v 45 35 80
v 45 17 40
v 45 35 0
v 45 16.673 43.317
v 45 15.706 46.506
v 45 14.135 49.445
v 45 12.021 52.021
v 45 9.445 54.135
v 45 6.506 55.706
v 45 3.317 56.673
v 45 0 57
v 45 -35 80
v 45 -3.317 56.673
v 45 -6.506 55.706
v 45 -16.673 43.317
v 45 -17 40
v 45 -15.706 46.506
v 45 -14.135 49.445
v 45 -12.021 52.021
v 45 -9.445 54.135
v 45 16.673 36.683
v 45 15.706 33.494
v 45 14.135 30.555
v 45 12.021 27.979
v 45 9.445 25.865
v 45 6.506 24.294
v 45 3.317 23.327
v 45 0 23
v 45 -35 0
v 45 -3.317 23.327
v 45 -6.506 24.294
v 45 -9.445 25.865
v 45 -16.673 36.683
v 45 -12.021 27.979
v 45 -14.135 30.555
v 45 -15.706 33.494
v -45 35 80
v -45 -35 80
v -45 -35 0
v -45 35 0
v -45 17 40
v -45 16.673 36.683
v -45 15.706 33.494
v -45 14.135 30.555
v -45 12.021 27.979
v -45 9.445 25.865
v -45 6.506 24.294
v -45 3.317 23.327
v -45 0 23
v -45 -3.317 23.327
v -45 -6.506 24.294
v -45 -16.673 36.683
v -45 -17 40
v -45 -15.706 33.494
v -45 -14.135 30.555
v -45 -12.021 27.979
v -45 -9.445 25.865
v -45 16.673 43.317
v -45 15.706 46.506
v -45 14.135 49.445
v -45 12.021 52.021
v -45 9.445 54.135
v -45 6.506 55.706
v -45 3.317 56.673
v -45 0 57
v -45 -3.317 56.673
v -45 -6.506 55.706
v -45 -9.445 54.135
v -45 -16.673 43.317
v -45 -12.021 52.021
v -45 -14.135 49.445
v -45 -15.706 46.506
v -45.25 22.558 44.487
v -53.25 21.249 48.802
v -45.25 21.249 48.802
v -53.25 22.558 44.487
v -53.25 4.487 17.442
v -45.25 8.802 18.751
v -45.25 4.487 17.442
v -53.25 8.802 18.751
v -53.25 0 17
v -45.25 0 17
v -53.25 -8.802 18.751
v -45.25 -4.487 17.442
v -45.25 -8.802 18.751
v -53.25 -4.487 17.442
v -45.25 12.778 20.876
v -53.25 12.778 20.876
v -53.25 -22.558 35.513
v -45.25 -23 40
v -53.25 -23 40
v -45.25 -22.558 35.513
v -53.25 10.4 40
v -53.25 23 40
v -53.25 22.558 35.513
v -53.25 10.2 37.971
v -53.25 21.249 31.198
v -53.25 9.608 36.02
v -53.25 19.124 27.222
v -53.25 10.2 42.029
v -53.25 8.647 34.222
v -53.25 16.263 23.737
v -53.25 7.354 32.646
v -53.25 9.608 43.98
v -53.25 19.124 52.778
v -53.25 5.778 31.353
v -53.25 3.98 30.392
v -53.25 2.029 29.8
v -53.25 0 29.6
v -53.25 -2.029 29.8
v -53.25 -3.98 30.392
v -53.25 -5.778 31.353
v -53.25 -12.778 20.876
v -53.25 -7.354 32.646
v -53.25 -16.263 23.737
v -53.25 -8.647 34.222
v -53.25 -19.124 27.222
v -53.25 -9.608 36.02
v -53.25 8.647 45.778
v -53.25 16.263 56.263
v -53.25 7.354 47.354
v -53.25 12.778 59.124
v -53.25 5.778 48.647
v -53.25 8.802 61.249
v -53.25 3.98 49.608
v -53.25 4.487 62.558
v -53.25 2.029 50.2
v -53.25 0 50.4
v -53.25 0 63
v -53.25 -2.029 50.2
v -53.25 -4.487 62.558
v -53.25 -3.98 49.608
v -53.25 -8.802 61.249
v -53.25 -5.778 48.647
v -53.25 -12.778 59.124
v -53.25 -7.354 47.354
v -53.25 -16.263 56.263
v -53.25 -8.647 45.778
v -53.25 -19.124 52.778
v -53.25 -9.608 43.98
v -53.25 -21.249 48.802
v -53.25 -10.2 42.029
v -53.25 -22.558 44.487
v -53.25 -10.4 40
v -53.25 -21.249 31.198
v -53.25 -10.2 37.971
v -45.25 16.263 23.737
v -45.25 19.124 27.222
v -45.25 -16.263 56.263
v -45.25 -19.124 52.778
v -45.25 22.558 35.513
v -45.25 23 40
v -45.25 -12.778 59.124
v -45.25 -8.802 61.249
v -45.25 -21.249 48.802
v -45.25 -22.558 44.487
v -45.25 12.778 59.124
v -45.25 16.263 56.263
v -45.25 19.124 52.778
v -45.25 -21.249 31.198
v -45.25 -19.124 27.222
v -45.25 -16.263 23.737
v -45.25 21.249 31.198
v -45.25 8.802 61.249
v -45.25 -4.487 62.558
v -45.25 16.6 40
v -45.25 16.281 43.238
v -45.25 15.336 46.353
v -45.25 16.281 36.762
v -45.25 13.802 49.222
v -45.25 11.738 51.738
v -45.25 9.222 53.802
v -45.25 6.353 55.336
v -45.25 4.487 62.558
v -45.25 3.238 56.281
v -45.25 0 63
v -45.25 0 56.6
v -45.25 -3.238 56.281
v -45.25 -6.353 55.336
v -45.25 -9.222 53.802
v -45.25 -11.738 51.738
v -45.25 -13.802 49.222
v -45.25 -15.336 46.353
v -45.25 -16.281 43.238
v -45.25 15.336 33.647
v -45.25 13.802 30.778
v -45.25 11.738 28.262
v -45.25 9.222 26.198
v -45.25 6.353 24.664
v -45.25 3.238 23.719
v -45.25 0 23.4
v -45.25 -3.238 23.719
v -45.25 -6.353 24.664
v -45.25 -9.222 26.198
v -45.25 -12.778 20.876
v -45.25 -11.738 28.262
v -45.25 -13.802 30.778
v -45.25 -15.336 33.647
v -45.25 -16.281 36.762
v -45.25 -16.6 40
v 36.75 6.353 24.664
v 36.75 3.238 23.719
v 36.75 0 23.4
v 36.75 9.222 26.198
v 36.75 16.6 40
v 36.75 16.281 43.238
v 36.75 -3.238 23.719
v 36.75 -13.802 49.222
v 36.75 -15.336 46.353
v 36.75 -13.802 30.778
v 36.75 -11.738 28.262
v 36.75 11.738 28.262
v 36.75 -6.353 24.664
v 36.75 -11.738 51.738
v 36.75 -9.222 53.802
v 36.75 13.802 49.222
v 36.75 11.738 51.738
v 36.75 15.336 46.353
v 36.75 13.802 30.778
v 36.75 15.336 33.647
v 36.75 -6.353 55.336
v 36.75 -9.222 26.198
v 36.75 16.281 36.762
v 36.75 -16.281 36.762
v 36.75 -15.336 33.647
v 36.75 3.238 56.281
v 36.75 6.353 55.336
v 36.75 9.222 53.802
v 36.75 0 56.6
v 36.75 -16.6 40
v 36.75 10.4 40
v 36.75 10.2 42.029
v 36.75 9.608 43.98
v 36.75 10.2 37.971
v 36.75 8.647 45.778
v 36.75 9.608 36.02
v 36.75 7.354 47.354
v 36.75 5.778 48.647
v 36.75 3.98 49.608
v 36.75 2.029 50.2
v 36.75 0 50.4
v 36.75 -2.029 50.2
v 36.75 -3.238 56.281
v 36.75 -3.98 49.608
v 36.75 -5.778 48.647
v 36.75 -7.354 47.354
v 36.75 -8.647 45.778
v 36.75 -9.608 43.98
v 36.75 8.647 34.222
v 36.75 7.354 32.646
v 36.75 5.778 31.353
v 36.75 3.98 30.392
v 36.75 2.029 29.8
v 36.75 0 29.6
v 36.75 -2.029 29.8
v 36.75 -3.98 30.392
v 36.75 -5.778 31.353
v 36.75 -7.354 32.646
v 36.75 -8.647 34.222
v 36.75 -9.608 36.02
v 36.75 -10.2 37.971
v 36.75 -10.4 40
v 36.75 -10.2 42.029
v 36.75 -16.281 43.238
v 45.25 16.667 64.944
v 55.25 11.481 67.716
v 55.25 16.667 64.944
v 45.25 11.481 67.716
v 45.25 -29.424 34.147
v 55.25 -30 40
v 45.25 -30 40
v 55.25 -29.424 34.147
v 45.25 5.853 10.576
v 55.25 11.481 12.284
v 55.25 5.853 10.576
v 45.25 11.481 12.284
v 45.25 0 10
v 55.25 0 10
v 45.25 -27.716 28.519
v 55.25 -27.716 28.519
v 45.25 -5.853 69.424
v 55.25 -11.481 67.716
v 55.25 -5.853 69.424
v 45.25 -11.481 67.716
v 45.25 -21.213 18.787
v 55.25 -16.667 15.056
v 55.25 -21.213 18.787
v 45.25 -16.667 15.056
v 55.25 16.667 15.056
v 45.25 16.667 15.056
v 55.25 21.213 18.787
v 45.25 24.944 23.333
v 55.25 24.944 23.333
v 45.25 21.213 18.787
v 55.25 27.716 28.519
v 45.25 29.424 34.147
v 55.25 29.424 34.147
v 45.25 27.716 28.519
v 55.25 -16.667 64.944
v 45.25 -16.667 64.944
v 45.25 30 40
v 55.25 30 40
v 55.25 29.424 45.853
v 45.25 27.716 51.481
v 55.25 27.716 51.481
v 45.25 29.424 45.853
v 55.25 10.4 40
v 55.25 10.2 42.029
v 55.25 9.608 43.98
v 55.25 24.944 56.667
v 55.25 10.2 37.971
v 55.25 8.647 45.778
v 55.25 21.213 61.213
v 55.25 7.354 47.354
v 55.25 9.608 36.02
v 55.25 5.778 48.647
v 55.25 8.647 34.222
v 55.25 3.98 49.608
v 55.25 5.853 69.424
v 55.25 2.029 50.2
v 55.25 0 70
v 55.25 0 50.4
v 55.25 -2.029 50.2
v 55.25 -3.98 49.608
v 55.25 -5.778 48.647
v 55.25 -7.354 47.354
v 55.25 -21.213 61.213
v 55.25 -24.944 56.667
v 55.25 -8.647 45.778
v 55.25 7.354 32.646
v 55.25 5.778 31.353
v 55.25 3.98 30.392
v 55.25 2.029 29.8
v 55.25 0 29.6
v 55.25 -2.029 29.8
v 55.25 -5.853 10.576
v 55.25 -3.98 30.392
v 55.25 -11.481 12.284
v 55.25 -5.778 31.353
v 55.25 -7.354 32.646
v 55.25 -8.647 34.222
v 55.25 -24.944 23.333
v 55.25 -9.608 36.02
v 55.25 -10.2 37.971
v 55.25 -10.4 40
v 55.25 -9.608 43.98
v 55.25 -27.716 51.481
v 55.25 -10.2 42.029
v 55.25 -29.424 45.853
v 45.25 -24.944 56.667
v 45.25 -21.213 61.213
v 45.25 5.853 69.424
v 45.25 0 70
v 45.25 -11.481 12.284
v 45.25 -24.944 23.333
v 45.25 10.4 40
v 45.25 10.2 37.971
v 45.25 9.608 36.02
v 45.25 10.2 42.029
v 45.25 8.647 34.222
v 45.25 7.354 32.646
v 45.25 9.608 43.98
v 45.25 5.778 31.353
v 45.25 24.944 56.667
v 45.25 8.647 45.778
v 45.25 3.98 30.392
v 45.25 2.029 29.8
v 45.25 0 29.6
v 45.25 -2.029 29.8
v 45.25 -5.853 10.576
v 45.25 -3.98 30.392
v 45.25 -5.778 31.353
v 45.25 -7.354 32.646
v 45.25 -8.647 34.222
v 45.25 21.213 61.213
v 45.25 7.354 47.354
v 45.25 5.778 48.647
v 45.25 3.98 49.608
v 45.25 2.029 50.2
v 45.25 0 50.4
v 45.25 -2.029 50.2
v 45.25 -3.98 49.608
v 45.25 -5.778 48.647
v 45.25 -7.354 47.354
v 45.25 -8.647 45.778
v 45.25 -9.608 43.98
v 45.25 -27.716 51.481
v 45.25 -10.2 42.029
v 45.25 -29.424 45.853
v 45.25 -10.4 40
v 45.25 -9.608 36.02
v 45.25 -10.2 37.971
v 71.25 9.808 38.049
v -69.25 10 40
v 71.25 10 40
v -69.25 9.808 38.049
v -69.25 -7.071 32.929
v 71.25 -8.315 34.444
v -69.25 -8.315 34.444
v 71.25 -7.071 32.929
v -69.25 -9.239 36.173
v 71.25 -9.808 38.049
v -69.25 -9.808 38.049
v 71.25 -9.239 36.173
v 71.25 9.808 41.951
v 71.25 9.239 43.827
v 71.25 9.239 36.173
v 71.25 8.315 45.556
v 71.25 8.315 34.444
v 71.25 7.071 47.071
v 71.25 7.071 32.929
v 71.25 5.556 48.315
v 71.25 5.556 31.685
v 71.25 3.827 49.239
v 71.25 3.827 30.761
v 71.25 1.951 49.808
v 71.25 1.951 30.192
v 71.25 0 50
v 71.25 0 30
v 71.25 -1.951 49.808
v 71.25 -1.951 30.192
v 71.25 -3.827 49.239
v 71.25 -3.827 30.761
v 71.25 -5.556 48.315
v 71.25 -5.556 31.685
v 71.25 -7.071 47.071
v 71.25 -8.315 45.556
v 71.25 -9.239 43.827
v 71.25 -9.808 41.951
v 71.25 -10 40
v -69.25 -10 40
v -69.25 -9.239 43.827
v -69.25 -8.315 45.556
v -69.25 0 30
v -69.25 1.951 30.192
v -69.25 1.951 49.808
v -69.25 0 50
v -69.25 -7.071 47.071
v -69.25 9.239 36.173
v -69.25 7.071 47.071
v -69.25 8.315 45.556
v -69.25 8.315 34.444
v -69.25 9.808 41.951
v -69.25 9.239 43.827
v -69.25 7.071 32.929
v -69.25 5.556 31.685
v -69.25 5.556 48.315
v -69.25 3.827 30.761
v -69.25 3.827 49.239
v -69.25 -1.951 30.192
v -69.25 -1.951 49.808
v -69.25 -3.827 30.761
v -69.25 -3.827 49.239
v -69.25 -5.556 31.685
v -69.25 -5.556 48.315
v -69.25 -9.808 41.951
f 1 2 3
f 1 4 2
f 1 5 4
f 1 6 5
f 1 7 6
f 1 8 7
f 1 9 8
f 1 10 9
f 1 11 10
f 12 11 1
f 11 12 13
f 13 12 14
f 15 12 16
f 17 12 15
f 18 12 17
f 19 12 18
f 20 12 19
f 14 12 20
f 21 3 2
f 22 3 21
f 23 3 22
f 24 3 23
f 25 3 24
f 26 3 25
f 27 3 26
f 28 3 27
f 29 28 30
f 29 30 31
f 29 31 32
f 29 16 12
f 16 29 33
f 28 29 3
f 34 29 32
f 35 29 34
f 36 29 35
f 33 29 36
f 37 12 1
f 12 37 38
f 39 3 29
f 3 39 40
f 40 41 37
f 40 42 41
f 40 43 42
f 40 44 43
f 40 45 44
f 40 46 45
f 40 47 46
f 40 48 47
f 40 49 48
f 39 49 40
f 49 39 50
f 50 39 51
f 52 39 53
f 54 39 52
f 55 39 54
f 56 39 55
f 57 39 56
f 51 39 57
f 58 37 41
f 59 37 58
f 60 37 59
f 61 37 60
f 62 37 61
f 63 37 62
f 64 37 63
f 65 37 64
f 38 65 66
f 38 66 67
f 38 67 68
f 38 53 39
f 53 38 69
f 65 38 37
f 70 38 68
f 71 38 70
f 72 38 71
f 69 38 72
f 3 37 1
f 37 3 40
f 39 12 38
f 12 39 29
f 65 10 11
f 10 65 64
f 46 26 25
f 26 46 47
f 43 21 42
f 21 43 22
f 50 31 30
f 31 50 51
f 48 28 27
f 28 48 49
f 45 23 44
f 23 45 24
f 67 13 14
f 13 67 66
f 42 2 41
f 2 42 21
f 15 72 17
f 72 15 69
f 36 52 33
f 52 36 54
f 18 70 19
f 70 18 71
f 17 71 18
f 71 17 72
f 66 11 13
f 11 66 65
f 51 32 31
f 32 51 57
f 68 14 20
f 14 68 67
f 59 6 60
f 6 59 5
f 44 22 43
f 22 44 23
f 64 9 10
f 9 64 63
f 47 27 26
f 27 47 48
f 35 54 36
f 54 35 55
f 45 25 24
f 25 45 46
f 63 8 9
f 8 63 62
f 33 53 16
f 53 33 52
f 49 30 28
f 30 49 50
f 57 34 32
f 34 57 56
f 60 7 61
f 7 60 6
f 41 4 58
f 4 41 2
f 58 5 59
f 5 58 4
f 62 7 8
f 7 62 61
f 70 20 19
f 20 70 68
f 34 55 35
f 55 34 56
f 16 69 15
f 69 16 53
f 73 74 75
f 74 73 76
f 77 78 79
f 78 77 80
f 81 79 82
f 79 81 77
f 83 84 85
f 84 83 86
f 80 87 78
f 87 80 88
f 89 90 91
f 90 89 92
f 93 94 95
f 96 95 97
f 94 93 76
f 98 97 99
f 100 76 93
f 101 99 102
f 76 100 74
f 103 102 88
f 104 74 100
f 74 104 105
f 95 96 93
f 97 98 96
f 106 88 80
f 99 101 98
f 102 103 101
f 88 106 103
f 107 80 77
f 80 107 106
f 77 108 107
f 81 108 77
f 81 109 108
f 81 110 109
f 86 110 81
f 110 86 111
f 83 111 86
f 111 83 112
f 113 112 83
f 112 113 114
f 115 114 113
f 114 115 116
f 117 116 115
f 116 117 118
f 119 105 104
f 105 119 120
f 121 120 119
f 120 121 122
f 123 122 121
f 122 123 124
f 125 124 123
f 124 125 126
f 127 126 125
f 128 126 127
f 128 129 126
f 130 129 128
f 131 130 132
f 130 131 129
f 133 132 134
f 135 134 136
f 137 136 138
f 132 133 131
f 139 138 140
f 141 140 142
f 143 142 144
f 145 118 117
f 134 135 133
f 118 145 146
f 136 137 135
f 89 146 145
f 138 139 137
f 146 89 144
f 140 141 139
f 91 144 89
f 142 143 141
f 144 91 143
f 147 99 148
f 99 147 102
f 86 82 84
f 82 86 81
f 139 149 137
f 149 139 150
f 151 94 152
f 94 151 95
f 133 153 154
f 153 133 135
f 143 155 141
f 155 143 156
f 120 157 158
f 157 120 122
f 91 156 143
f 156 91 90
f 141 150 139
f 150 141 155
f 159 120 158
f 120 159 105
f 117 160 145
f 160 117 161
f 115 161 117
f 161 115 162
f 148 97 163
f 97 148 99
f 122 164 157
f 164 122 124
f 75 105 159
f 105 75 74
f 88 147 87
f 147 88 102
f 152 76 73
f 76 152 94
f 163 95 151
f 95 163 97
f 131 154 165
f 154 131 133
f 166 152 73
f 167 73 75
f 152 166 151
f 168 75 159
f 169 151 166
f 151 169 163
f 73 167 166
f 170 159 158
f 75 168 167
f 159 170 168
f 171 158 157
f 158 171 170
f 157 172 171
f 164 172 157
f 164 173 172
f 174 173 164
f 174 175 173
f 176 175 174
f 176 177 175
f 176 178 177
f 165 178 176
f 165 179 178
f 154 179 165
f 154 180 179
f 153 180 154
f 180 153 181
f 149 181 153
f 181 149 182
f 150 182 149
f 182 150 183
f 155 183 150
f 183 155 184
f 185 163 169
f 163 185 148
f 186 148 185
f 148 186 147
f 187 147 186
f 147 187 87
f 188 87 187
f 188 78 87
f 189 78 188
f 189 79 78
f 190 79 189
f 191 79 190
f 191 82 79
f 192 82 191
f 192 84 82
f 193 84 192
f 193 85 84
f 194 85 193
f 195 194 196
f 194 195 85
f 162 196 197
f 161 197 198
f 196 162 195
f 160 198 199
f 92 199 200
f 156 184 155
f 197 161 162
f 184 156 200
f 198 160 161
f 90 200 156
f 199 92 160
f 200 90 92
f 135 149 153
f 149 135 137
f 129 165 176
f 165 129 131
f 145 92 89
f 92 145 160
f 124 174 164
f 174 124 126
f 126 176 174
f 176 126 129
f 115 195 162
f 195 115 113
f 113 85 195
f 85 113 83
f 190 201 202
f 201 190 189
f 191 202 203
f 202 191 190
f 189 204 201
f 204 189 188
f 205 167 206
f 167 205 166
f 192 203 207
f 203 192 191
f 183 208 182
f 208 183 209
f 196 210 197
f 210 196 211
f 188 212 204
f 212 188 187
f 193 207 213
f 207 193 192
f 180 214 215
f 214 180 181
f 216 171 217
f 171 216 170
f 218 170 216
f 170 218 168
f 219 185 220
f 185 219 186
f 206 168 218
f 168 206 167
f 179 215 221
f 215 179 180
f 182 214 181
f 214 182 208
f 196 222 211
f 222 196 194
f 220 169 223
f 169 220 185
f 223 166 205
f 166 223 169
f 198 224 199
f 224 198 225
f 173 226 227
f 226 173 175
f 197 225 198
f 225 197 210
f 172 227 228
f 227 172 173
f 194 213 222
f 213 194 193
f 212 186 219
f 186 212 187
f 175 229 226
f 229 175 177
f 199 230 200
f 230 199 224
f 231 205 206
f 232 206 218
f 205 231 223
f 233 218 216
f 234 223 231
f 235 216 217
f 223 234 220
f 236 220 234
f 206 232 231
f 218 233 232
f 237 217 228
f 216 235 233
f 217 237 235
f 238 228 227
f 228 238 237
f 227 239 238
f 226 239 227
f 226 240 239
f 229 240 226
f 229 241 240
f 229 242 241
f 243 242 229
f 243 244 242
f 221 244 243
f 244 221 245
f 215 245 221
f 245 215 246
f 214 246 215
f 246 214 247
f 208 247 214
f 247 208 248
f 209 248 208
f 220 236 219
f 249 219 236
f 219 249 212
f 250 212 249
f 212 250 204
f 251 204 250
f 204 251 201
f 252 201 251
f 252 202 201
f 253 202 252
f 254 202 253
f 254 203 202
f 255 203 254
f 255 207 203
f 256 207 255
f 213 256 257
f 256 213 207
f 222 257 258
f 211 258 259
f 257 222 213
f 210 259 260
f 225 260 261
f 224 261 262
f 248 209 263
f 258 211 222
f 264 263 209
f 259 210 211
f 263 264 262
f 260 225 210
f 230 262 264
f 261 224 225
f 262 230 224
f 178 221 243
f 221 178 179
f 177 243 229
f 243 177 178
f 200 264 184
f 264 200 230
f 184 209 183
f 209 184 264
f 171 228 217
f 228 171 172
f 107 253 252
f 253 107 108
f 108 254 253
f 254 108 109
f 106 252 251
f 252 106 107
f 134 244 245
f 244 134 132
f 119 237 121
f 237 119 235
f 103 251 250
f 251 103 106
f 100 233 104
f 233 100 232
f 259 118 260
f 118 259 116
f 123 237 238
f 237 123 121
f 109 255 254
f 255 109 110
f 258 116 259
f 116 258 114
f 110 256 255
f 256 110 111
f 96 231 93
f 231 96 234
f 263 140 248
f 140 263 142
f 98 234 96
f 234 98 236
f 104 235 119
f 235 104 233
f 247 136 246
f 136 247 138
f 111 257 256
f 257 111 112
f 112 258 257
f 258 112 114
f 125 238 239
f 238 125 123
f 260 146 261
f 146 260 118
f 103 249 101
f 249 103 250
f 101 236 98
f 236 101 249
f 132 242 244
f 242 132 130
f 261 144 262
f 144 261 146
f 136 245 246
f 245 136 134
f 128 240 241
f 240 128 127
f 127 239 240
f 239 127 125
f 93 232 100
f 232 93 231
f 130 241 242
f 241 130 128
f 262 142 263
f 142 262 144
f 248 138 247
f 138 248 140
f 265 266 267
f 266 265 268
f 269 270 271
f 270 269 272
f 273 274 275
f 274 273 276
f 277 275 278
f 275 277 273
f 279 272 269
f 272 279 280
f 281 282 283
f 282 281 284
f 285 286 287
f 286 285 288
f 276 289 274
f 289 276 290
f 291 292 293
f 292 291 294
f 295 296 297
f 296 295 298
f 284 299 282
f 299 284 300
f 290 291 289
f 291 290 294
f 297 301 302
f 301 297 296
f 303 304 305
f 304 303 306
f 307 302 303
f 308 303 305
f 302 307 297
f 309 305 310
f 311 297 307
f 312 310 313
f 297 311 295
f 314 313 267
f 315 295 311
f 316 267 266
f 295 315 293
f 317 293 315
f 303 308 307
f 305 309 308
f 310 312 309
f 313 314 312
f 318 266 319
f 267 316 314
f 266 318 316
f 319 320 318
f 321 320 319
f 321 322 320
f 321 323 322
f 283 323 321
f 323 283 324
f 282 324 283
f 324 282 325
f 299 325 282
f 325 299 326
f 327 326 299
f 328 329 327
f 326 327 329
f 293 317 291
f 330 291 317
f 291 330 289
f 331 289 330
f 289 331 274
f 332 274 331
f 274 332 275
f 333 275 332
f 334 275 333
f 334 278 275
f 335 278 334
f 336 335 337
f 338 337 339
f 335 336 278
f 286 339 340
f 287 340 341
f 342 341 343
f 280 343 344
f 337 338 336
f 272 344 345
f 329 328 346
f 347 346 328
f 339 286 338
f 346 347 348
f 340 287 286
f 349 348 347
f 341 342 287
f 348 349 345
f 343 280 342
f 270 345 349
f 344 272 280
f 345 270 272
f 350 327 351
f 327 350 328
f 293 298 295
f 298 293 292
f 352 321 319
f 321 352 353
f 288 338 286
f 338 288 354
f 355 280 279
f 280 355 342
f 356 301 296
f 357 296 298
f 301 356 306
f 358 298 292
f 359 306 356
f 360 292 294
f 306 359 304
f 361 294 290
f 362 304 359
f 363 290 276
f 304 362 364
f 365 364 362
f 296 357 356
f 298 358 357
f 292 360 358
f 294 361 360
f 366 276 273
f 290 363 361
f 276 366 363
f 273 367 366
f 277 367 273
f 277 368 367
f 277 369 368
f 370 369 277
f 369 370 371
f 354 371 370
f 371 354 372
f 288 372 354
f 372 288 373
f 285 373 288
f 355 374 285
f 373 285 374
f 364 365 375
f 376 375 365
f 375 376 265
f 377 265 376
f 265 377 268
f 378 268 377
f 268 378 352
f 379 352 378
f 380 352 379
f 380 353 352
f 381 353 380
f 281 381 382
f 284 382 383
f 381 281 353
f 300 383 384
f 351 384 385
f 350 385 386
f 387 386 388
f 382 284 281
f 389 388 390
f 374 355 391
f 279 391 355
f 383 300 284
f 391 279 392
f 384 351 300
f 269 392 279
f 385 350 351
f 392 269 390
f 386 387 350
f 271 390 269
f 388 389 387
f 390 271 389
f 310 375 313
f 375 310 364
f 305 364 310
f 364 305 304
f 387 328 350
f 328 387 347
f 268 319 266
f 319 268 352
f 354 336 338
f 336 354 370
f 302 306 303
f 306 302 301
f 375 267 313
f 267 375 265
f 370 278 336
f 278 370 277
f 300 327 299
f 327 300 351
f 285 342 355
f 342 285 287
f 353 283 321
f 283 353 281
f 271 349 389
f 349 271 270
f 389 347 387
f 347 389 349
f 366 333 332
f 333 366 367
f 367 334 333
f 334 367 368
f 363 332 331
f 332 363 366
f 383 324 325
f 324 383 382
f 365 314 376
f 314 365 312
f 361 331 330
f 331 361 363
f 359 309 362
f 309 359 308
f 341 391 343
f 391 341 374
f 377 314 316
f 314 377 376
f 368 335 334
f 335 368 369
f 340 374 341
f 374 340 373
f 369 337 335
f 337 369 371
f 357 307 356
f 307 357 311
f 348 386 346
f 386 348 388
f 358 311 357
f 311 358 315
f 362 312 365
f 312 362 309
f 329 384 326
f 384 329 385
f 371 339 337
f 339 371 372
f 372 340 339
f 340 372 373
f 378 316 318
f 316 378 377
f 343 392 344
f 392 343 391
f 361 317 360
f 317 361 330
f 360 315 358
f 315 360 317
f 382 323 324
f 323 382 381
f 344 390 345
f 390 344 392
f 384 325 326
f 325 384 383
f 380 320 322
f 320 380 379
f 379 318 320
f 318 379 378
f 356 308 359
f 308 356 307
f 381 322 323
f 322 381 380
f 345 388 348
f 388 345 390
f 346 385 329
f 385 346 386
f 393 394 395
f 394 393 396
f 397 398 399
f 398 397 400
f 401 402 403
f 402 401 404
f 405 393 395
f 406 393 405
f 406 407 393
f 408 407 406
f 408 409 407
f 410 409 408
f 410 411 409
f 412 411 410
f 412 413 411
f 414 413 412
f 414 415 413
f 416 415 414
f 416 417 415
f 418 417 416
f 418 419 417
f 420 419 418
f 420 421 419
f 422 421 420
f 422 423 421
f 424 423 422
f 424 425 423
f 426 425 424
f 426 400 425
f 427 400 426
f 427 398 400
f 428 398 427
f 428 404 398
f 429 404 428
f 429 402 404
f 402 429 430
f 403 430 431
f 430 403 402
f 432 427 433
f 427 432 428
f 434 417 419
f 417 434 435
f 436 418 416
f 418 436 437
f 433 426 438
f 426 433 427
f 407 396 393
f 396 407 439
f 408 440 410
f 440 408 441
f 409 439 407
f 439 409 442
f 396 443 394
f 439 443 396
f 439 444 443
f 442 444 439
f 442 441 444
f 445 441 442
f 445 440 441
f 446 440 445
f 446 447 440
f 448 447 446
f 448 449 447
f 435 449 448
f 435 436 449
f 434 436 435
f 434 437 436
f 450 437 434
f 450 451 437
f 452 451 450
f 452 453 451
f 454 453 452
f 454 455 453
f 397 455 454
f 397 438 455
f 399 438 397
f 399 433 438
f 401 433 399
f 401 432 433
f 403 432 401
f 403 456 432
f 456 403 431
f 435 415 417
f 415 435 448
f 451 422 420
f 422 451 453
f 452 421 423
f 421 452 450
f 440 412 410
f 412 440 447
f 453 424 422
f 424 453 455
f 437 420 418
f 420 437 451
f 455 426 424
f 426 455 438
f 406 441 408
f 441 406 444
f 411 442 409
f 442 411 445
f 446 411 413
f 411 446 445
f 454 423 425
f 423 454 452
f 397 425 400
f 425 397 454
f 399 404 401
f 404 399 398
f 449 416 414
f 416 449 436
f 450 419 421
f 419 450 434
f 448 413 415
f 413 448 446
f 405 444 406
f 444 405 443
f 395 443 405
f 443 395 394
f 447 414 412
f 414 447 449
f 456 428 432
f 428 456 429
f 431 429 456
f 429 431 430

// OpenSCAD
$fn = 32;

// ------------------------------------------------------------------------
// Bushed housing: 90 x 70 x 80 mm housing, bushing d33.2
// Every part is its own module, assembly() places them once.
// ------------------------------------------------------------------------

// --- part 1 ---
module housing() {
  difference() {
    translate([-45, -35, 0]) cube([90, 70, 80]);
    translate([0, 0, 40]) rotate([0, 90, 0]) cylinder(h = 92, d = 34, center = true);
  }
}

// --- part 2 ---
module bushing() {
  difference() {
    union() {
      cylinder(h = 8, d = 46);
      translate([0, 0, 8]) cylinder(h = 82, d = 33.2);
    }
    translate([0, 0, -1]) cylinder(h = 92, d = 20.8);
  }
}

// --- part 3 ---
module shaft() {
  translate([0, 0, -70.25]) cylinder(h = 140.5, d = 20);
}

// --- part 4 ---
module cover() {
  difference() {
    cylinder(h = 10, d = 60);
    translate([0, 0, -1]) cylinder(h = 12, d = 20.8);
  }
}

// --- assembly ---
module assembly() {
  translate([0, 0, 0]) rotate([0, 0, 0]) housing();
  translate([-53.25, 0, 40]) rotate([0, 90, 0]) bushing();
  translate([1, 0, 40]) rotate([0, 90, 0]) shaft();
  translate([45.25, 0, 40]) rotate([0, 90, 0]) cover();
}

assembly();
